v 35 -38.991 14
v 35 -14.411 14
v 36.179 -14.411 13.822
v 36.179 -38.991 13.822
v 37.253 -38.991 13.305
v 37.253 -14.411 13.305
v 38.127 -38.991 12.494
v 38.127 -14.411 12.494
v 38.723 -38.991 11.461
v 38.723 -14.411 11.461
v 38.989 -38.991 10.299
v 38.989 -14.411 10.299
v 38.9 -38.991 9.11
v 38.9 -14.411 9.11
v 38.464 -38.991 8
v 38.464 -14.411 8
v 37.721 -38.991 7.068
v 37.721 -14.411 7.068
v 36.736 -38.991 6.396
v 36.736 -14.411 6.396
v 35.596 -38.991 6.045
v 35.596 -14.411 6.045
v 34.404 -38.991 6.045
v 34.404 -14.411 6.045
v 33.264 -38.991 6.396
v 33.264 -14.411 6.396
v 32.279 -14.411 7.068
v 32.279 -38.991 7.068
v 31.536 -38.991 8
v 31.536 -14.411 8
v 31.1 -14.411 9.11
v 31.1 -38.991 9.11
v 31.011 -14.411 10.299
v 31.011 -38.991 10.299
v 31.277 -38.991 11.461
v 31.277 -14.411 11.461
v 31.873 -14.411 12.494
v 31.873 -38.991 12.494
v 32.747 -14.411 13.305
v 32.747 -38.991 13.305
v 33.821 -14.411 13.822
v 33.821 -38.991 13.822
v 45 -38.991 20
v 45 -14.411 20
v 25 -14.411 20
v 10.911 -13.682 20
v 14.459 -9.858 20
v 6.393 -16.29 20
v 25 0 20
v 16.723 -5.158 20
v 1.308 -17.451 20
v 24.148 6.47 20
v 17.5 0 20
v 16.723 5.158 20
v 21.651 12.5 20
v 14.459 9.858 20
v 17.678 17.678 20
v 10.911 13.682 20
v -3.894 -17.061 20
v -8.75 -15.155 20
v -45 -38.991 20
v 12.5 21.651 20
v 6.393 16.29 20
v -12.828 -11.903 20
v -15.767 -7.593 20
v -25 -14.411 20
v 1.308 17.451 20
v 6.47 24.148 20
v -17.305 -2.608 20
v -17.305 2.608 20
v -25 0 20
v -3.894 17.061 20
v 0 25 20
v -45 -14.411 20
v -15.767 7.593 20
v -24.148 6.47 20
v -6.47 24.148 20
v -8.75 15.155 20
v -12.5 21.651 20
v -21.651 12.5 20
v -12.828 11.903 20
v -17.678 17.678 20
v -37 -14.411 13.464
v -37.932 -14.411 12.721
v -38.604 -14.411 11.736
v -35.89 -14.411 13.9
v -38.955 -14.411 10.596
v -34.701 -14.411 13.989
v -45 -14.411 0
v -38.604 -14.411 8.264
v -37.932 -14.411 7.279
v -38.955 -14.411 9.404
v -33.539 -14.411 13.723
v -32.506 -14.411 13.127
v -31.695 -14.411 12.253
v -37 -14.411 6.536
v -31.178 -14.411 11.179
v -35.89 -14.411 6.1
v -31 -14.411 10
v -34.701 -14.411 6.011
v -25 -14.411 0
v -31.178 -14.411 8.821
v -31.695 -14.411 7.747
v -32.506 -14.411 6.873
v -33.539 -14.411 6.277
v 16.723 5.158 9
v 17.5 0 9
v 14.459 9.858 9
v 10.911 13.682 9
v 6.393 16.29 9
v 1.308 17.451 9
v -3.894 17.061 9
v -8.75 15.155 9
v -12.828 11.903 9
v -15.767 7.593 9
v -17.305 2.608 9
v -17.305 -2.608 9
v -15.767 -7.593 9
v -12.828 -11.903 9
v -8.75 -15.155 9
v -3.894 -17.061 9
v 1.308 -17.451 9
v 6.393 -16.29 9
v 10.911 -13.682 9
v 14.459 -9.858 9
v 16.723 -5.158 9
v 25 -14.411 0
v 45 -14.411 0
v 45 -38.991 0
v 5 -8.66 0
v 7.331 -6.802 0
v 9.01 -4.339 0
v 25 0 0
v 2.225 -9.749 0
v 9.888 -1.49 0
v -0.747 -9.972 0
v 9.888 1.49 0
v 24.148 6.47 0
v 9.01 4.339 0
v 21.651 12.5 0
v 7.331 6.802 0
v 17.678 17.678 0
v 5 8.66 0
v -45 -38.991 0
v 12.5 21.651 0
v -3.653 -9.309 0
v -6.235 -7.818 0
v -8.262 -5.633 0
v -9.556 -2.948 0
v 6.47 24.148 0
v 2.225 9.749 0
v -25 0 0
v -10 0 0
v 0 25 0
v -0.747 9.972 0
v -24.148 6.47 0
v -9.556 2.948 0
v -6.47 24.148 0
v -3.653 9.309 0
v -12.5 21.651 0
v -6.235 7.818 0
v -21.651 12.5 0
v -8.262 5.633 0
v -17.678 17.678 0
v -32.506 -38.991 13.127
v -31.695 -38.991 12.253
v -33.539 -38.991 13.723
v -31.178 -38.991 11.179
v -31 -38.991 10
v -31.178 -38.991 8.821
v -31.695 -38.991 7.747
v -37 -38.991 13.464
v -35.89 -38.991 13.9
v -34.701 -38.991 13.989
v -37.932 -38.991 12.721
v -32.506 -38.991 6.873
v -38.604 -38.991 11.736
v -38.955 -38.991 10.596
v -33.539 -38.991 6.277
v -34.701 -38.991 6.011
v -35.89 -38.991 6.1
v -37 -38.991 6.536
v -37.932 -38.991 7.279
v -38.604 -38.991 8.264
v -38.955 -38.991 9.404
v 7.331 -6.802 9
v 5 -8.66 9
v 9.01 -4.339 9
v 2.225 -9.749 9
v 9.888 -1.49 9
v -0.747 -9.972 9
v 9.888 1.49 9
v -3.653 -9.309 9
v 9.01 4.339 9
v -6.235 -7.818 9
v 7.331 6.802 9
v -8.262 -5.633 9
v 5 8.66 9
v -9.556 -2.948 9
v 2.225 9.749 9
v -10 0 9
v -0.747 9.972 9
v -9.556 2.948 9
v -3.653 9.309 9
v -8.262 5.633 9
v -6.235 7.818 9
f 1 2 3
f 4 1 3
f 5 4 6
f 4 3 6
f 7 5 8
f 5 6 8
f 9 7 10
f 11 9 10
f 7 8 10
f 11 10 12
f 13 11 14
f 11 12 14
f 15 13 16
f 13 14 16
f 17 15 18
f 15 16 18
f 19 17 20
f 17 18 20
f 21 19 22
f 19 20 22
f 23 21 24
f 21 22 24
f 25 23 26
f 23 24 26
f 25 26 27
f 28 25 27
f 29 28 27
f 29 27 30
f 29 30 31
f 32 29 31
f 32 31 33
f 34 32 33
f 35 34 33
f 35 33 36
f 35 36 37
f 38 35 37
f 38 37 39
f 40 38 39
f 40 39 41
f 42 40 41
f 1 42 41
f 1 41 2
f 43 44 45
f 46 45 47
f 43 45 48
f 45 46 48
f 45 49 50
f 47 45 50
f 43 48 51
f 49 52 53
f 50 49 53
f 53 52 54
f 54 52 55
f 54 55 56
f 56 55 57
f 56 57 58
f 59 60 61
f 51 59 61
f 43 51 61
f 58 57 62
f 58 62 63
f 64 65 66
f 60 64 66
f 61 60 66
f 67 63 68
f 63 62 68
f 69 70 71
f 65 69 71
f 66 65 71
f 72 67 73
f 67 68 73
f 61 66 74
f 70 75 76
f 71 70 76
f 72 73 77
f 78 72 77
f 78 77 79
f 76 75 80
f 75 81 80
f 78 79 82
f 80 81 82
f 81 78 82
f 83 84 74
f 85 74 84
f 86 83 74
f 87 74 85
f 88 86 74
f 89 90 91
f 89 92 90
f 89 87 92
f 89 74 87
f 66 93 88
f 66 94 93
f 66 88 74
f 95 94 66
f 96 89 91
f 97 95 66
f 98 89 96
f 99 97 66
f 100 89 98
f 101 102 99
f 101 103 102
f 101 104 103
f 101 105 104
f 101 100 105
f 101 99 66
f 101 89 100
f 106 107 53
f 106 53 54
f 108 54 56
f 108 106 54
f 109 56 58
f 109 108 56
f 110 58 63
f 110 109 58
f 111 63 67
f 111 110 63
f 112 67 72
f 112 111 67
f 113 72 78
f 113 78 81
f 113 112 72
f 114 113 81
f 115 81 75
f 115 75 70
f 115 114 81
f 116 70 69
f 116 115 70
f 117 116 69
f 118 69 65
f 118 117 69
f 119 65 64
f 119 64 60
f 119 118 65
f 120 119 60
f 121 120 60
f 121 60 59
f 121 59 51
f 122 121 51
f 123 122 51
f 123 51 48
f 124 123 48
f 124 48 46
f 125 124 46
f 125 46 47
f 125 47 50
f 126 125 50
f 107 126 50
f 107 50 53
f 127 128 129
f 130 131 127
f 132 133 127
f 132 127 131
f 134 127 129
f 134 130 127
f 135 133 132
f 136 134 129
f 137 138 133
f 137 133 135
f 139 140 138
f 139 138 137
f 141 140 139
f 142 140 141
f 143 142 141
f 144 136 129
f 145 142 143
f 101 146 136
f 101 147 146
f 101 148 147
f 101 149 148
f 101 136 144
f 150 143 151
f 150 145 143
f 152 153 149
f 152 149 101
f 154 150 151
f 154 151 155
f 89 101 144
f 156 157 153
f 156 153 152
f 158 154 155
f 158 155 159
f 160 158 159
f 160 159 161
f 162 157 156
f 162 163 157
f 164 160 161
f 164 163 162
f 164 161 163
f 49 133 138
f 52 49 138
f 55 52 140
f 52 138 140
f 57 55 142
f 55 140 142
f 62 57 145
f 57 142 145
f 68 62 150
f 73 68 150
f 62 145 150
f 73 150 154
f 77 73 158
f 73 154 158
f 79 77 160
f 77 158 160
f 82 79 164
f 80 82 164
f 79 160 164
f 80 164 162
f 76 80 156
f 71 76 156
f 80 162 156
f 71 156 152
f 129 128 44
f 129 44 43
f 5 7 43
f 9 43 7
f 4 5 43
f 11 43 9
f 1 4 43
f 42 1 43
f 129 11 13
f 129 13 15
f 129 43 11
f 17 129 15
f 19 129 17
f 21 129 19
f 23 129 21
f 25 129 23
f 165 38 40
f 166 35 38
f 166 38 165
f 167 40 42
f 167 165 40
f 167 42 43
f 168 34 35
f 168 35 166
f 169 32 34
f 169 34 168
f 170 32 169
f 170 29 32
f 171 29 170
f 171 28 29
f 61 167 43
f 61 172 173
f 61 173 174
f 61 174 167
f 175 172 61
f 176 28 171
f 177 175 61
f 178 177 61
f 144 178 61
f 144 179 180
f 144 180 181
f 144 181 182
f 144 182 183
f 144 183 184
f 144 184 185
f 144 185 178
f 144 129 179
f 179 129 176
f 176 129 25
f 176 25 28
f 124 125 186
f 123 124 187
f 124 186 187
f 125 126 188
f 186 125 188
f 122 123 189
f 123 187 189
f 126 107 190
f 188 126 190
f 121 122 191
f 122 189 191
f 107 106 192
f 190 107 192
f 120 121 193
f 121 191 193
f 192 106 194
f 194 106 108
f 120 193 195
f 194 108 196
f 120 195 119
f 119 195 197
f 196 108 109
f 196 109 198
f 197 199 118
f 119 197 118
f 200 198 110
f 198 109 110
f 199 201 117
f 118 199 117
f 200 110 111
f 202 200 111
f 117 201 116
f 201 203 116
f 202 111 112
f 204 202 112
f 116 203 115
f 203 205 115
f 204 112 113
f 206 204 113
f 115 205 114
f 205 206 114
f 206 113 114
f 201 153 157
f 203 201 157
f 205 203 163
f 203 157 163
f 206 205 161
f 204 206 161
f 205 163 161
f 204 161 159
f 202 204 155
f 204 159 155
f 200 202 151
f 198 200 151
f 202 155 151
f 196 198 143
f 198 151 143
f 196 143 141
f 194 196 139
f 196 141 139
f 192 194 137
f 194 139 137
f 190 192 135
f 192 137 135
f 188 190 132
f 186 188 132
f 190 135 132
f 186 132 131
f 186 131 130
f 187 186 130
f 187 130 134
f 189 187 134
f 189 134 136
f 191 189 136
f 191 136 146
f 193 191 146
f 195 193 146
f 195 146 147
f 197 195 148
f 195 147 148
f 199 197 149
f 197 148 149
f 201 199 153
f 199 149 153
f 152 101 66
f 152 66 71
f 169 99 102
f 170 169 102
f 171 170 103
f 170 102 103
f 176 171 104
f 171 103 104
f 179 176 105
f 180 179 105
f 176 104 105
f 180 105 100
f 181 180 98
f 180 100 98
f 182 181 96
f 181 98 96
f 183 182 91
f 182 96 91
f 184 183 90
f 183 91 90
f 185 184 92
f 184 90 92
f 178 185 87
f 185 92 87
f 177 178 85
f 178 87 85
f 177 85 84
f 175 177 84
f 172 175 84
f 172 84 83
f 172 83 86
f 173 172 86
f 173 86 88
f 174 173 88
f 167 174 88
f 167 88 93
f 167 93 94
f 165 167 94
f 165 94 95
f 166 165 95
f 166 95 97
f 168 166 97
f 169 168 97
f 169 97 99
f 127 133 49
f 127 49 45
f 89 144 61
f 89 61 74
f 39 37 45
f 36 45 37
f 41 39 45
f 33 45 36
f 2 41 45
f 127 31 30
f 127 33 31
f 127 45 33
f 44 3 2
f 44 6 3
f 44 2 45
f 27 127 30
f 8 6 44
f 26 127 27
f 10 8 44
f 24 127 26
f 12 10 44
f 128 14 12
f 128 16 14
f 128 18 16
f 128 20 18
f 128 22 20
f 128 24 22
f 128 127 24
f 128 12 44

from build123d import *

# Parameters (mm, degrees)
SKETCH1_R           = 25
SKETCH1_R_2         = 17.5
BOSS_EXTRUDE1_DEPTH = 20
BOSS_EXTRUDE2_START = -20
BOSS_EXTRUDE2_DEPTH = 20
SKETCH3_R           = 20
SKETCH3_R_2         = 10
BOSS_EXTRUDE3_DEPTH = 9
SKETCH4_R           = 4
CUT_EXTRUDE1_DEPTH  = 30


with BuildPart() as part:
    # Sketch1 → Boss-Extrude1 (new body)
    with BuildSketch(Plane.XY):
        Circle(SKETCH1_R)
        Circle(SKETCH1_R_2, mode=Mode.SUBTRACT)
    extrude(amount=BOSS_EXTRUDE1_DEPTH)

    # Sketch2 → Boss-Extrude2 (add)
    with BuildSketch(Plane.XY.offset(20).offset(BOSS_EXTRUDE2_START)):
        with BuildLine():
            Line((25, 0), (25, -14.411258269))
            Line((25, -14.411258269), (45, -14.411258269))
            Line((45, -14.411258269), (45, -38.991258269))
            Line((45, -38.991258269), (-45, -38.991258269))
            Line((-45, -38.991258269), (-45, -14.411258269))
            Line((-45, -14.411258269), (-25, -14.411258269))
            Line((-25, -14.411258269), (-25, 0))
            ThreePointArc((-25, 0), (0, -25), (25, 0))
        make_face()
    extrude(amount=BOSS_EXTRUDE2_DEPTH)

    # Sketch3 → Boss-Extrude3 (add)
    with BuildSketch(Plane(origin=(0, 0, 0), x_dir=(-1, 0, 0), z_dir=(0, 0, -1))):
        Circle(SKETCH3_R)
        Circle(SKETCH3_R_2, mode=Mode.SUBTRACT)
    extrude(amount=-BOSS_EXTRUDE3_DEPTH)

    # Sketch4 → Cut-Extrude1 (cut)
    with BuildSketch(Plane(origin=(0, -14.411258269, 0), x_dir=(1, 0, 0), z_dir=(0, 1, 0))):
        with Locations(Location((35, -10, 0), (0, 0, 270))):
            Circle(SKETCH4_R)
        with Locations((-35, -10)):
            Circle(SKETCH4_R)
    extrude(amount=-CUT_EXTRUDE1_DEPTH, mode=Mode.SUBTRACT)


solid = part.part
